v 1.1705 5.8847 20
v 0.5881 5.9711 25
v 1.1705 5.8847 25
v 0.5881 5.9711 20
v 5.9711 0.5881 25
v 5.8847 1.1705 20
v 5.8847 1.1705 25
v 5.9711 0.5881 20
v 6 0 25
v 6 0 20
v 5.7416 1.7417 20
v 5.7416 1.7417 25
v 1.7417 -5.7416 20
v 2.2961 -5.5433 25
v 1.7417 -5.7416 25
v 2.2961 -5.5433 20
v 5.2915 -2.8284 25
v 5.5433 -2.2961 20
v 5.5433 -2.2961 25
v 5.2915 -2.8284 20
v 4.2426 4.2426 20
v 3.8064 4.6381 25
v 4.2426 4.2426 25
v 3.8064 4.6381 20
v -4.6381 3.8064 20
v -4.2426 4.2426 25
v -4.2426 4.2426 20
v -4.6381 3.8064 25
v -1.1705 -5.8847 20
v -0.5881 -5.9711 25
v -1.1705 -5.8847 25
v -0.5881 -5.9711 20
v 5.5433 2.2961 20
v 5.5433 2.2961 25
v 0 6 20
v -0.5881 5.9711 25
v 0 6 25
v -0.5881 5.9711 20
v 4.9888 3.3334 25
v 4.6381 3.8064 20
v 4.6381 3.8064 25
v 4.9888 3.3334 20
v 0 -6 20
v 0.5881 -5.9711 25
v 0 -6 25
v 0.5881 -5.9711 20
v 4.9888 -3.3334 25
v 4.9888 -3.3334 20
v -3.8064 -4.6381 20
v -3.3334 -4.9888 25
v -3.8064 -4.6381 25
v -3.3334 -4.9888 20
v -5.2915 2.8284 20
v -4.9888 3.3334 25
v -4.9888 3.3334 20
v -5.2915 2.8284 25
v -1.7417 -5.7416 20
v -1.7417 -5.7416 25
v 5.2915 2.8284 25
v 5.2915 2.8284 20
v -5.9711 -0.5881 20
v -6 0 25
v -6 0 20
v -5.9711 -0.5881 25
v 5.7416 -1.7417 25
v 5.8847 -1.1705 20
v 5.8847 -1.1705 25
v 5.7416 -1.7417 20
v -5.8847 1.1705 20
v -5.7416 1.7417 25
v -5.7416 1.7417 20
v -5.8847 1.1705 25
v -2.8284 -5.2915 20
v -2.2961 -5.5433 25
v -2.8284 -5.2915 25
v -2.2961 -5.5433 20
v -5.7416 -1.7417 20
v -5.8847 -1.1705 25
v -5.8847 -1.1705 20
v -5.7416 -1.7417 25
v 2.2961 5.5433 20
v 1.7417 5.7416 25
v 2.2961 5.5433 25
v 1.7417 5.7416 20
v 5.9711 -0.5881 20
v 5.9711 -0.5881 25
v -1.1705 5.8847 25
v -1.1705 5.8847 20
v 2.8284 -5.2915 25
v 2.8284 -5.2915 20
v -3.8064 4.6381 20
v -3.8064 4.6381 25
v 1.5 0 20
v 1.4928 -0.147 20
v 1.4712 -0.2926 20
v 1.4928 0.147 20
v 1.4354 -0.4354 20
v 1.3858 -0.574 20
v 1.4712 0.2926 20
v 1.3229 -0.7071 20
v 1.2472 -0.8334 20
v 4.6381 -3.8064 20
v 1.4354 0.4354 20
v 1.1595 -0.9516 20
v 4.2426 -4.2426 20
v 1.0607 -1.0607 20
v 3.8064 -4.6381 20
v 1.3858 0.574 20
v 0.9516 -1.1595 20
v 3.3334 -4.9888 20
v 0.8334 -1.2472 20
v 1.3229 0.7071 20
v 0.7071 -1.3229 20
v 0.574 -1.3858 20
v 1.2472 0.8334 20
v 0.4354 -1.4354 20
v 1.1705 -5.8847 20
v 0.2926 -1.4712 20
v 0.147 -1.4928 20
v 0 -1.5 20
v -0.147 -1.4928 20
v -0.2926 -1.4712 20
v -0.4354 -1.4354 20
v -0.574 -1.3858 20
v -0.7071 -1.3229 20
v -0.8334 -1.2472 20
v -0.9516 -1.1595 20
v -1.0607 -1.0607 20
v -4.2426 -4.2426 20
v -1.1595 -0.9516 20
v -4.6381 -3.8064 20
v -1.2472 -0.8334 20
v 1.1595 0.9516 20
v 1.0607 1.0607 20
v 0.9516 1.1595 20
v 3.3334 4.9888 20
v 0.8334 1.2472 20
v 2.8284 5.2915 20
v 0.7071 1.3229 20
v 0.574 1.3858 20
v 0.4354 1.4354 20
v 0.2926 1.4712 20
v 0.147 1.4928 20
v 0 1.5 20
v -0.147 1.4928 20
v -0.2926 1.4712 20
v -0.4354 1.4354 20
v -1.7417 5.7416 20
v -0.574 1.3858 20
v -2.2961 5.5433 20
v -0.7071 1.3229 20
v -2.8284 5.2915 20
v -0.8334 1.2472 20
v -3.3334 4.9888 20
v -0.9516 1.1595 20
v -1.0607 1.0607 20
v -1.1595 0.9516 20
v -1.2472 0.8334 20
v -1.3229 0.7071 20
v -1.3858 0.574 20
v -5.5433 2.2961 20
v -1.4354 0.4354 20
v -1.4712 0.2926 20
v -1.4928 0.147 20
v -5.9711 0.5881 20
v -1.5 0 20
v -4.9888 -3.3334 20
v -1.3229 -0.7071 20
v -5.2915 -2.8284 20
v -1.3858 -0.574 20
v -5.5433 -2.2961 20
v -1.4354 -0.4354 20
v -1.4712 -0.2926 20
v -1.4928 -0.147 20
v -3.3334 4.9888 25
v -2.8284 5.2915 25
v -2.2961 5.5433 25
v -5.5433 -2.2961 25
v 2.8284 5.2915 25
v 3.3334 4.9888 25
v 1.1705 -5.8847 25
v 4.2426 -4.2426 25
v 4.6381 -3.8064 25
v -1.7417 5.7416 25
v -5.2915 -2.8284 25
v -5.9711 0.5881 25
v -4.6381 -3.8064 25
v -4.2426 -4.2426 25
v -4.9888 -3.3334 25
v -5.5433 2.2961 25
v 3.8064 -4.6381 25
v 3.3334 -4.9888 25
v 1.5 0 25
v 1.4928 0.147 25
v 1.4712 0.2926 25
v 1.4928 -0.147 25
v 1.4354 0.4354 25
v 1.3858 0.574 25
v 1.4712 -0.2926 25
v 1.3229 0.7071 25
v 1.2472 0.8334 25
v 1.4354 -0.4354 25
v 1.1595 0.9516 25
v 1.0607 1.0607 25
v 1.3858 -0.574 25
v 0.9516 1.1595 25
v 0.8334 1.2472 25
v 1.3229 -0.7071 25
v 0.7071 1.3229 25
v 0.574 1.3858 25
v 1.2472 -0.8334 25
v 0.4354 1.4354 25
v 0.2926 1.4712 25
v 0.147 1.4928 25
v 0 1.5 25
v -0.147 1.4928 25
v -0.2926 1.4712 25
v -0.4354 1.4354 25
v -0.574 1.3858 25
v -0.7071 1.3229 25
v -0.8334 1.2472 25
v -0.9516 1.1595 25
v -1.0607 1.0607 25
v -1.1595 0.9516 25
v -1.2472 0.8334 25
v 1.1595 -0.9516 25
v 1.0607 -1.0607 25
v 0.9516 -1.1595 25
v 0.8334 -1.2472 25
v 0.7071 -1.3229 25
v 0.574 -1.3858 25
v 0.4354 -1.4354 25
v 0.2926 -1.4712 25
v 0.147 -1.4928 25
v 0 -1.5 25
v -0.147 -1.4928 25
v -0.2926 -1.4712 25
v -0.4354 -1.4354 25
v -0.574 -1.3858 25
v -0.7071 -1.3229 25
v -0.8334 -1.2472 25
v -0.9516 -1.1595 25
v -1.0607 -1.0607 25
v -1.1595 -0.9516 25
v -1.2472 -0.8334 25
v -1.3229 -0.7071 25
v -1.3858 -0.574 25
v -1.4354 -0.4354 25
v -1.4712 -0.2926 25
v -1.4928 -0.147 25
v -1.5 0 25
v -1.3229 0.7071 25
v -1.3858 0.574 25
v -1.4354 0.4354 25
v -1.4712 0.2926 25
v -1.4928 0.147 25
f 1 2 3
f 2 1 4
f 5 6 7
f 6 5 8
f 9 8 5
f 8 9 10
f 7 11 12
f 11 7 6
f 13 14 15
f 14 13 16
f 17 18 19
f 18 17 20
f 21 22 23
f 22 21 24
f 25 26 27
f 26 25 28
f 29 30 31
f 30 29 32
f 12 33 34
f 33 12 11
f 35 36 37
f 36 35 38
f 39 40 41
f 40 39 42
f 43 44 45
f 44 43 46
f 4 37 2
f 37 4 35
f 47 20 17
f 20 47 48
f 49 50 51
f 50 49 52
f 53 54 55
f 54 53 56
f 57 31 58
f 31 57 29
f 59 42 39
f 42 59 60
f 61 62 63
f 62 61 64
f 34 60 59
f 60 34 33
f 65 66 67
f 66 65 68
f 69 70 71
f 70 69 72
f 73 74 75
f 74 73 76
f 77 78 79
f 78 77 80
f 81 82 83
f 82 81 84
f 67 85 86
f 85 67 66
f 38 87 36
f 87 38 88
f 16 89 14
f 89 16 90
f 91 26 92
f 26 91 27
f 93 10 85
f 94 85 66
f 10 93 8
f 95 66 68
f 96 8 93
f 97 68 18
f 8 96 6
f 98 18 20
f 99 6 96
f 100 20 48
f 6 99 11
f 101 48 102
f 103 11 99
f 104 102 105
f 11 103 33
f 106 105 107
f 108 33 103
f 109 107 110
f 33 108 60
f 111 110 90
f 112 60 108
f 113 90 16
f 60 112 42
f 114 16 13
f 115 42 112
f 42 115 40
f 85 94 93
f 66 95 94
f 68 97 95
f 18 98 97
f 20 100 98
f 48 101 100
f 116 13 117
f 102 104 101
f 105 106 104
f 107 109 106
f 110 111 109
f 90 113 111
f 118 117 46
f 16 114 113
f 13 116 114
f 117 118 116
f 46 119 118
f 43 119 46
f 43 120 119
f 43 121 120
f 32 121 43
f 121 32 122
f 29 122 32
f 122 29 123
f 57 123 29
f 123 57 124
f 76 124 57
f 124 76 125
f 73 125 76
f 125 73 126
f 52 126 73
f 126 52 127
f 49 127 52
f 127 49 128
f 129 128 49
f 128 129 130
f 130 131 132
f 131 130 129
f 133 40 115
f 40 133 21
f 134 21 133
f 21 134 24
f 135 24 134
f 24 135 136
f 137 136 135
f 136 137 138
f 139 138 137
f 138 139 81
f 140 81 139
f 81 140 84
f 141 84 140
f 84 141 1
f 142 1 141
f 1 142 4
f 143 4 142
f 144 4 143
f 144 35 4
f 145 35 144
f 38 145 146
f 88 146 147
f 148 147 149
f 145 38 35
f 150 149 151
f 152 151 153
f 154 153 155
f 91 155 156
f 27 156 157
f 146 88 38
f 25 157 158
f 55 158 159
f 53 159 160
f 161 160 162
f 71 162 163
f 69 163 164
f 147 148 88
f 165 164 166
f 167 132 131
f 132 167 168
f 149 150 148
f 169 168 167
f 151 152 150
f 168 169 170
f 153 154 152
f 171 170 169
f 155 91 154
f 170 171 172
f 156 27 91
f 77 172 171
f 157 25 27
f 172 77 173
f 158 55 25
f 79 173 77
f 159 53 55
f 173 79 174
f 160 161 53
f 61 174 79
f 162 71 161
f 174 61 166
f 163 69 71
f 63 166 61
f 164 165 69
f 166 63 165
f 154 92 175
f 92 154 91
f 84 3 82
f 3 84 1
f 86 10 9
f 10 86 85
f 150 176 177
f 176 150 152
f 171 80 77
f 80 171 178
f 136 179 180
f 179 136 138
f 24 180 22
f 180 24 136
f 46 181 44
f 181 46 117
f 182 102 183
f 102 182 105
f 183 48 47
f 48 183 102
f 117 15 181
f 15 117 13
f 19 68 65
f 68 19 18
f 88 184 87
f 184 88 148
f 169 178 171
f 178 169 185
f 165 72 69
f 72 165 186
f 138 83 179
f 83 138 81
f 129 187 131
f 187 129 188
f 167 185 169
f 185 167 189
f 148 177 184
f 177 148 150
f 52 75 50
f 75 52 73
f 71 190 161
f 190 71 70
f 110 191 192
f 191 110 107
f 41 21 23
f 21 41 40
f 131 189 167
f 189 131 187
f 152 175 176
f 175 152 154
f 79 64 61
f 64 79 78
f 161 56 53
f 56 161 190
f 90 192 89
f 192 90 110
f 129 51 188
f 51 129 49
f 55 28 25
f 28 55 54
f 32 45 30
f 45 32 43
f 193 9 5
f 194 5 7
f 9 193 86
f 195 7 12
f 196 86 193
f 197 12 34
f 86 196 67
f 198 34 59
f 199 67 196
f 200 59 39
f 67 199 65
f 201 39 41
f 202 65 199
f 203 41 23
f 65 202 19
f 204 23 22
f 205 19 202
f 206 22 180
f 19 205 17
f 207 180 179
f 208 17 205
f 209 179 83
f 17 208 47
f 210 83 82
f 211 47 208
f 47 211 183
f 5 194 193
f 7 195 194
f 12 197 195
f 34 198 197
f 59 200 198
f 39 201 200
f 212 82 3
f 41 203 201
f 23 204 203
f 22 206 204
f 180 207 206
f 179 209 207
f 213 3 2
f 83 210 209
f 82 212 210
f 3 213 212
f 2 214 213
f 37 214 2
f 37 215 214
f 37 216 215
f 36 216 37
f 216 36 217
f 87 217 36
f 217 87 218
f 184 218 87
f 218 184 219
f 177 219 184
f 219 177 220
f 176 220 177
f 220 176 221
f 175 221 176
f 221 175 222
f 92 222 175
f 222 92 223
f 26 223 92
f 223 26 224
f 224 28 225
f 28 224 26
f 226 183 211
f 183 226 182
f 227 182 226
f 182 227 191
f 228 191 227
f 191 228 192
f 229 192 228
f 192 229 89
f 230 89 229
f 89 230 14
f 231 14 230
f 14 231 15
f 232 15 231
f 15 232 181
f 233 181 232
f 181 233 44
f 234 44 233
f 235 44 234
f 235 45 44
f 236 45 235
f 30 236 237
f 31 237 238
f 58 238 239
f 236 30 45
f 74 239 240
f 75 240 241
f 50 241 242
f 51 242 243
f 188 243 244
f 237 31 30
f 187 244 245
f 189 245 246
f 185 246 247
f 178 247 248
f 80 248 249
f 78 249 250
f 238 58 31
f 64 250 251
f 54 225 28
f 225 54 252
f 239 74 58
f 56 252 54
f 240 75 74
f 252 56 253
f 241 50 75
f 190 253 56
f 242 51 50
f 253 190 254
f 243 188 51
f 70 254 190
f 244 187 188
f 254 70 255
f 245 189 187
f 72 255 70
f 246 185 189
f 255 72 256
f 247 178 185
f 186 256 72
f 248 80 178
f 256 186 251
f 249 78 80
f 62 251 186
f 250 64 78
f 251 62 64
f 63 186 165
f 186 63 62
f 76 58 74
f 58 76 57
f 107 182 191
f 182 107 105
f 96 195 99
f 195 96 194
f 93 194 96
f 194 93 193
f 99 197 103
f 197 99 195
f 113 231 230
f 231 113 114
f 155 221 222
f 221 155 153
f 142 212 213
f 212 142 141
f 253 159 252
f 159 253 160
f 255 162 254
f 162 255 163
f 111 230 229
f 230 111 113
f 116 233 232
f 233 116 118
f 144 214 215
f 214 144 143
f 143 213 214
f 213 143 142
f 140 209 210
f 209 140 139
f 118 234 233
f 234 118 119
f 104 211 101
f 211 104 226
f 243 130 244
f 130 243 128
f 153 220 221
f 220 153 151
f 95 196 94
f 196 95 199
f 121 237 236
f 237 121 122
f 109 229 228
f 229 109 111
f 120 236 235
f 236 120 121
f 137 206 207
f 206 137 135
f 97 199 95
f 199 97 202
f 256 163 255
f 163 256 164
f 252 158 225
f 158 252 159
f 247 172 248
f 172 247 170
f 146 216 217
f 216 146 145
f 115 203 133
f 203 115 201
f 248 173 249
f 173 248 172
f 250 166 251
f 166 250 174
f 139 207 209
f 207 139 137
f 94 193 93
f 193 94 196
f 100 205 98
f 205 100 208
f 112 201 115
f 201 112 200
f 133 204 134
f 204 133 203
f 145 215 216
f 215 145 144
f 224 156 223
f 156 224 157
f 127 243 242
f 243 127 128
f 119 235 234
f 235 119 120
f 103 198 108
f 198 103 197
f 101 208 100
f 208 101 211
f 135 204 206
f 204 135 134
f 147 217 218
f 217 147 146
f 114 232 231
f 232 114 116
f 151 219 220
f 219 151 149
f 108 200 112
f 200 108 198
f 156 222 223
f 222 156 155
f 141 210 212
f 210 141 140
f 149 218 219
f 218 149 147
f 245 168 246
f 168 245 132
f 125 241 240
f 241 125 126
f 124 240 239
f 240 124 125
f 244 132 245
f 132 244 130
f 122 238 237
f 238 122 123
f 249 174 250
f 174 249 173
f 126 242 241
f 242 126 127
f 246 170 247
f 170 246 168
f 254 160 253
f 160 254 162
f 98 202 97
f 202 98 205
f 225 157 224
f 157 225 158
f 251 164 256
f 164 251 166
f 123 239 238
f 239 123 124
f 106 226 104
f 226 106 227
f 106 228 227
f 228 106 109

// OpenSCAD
// Hose-barb reducer: 8 mm ID silicone tubing (bottom) to 5 mm ID silicone tubing (top)
// Printed upright, rotationally symmetric about Z, 3 mm bore through full length.

// ---- Global ----
$fn = 64;

// ---- Bore ----
bore_d = 3;          // straight through-bore diameter
bore_r = bore_d / 2;

// ---- 8 mm tubing barbs (bottom, z 0..20) ----
barb8_h   = 10;      // height of each 8 mm barb
barb8_bot = 7.5;     // outer diameter at barb bottom
barb8_top = 9.5;     // outer diameter at barb top (sawtooth peak)
n8        = 2;      // number of 8 mm barbs

// ---- Collar (z 20..25) ----
collar_d  = 12;      // collar outer diameter
collar_h  = 5;       // collar height

// ---- 5 mm tubing barbs (top, z 25..41) ----
barb5_h   = 8;       // height of each 5 mm barb
barb5_bot = 6.5;     // outer diameter at barb bottom
barb5_top = 5.0;     // outer diameter at barb top (sawtooth peak)
n5        = 2;      // number of 5 mm barbs

// ---- Derived ----
z8_start  = 0;
z8_end    = z8_start + n8 * barb8_h;          // 20
zcollar   = z8_end;
z5_start  = zcollar + collar_h;               // 25
z5_end    = z5_start + n5 * barb5_h;         // 41
total_h   = z5_end;

// Sawtooth profile for a single 8 mm barb (local z 0..barb8_h)
// bottom radius = barb8_bot/2, top radius = barb8_top/2, then step back to bottom radius.
profile8 = [
    [barb8_bot/2, 0],
    [barb8_top/2, barb8_h],
    [barb8_bot/2, barb8_h],
    [barb8_bot/2, 0]
];

// Sawtooth profile for a single 5 mm barb (local z 0..barb5_h)
// bottom radius = barb5_bot/2, top radius = barb5_top/2, then step back to bottom radius.
profile5 = [
    [barb5_bot/2, 0],
    [barb5_top/2, barb5_h],
    [barb5_bot/2, barb5_h],
    [barb5_bot/2, 0]
];

// ---- Build the solid ----
difference() {
    union() {
        // 8 mm barbs (bottom)
        for (i = [0 : n8 - 1]) {
            translate([0, 0, z8_start + i * barb8_h])
                rotate_extrude(profile8);
        }

        // Collar
        translate([0, 0, zcollar])
            cylinder(h = collar_h, d = collar_d, $fn = $fn);

        // 5 mm barbs (top)
        for (i = [0 : n5 - 1]) {
            translate([0, 0, z5_start + i * barb5_h])
                rotate_extrude(profile5);
        }
    }

    // Bore: extends 1 mm past both ends so no faces are coplanar
    translate([0, 0, -1])
        cylinder(h = total_h + 2, d = bore_d, $fn = $fn);
}
